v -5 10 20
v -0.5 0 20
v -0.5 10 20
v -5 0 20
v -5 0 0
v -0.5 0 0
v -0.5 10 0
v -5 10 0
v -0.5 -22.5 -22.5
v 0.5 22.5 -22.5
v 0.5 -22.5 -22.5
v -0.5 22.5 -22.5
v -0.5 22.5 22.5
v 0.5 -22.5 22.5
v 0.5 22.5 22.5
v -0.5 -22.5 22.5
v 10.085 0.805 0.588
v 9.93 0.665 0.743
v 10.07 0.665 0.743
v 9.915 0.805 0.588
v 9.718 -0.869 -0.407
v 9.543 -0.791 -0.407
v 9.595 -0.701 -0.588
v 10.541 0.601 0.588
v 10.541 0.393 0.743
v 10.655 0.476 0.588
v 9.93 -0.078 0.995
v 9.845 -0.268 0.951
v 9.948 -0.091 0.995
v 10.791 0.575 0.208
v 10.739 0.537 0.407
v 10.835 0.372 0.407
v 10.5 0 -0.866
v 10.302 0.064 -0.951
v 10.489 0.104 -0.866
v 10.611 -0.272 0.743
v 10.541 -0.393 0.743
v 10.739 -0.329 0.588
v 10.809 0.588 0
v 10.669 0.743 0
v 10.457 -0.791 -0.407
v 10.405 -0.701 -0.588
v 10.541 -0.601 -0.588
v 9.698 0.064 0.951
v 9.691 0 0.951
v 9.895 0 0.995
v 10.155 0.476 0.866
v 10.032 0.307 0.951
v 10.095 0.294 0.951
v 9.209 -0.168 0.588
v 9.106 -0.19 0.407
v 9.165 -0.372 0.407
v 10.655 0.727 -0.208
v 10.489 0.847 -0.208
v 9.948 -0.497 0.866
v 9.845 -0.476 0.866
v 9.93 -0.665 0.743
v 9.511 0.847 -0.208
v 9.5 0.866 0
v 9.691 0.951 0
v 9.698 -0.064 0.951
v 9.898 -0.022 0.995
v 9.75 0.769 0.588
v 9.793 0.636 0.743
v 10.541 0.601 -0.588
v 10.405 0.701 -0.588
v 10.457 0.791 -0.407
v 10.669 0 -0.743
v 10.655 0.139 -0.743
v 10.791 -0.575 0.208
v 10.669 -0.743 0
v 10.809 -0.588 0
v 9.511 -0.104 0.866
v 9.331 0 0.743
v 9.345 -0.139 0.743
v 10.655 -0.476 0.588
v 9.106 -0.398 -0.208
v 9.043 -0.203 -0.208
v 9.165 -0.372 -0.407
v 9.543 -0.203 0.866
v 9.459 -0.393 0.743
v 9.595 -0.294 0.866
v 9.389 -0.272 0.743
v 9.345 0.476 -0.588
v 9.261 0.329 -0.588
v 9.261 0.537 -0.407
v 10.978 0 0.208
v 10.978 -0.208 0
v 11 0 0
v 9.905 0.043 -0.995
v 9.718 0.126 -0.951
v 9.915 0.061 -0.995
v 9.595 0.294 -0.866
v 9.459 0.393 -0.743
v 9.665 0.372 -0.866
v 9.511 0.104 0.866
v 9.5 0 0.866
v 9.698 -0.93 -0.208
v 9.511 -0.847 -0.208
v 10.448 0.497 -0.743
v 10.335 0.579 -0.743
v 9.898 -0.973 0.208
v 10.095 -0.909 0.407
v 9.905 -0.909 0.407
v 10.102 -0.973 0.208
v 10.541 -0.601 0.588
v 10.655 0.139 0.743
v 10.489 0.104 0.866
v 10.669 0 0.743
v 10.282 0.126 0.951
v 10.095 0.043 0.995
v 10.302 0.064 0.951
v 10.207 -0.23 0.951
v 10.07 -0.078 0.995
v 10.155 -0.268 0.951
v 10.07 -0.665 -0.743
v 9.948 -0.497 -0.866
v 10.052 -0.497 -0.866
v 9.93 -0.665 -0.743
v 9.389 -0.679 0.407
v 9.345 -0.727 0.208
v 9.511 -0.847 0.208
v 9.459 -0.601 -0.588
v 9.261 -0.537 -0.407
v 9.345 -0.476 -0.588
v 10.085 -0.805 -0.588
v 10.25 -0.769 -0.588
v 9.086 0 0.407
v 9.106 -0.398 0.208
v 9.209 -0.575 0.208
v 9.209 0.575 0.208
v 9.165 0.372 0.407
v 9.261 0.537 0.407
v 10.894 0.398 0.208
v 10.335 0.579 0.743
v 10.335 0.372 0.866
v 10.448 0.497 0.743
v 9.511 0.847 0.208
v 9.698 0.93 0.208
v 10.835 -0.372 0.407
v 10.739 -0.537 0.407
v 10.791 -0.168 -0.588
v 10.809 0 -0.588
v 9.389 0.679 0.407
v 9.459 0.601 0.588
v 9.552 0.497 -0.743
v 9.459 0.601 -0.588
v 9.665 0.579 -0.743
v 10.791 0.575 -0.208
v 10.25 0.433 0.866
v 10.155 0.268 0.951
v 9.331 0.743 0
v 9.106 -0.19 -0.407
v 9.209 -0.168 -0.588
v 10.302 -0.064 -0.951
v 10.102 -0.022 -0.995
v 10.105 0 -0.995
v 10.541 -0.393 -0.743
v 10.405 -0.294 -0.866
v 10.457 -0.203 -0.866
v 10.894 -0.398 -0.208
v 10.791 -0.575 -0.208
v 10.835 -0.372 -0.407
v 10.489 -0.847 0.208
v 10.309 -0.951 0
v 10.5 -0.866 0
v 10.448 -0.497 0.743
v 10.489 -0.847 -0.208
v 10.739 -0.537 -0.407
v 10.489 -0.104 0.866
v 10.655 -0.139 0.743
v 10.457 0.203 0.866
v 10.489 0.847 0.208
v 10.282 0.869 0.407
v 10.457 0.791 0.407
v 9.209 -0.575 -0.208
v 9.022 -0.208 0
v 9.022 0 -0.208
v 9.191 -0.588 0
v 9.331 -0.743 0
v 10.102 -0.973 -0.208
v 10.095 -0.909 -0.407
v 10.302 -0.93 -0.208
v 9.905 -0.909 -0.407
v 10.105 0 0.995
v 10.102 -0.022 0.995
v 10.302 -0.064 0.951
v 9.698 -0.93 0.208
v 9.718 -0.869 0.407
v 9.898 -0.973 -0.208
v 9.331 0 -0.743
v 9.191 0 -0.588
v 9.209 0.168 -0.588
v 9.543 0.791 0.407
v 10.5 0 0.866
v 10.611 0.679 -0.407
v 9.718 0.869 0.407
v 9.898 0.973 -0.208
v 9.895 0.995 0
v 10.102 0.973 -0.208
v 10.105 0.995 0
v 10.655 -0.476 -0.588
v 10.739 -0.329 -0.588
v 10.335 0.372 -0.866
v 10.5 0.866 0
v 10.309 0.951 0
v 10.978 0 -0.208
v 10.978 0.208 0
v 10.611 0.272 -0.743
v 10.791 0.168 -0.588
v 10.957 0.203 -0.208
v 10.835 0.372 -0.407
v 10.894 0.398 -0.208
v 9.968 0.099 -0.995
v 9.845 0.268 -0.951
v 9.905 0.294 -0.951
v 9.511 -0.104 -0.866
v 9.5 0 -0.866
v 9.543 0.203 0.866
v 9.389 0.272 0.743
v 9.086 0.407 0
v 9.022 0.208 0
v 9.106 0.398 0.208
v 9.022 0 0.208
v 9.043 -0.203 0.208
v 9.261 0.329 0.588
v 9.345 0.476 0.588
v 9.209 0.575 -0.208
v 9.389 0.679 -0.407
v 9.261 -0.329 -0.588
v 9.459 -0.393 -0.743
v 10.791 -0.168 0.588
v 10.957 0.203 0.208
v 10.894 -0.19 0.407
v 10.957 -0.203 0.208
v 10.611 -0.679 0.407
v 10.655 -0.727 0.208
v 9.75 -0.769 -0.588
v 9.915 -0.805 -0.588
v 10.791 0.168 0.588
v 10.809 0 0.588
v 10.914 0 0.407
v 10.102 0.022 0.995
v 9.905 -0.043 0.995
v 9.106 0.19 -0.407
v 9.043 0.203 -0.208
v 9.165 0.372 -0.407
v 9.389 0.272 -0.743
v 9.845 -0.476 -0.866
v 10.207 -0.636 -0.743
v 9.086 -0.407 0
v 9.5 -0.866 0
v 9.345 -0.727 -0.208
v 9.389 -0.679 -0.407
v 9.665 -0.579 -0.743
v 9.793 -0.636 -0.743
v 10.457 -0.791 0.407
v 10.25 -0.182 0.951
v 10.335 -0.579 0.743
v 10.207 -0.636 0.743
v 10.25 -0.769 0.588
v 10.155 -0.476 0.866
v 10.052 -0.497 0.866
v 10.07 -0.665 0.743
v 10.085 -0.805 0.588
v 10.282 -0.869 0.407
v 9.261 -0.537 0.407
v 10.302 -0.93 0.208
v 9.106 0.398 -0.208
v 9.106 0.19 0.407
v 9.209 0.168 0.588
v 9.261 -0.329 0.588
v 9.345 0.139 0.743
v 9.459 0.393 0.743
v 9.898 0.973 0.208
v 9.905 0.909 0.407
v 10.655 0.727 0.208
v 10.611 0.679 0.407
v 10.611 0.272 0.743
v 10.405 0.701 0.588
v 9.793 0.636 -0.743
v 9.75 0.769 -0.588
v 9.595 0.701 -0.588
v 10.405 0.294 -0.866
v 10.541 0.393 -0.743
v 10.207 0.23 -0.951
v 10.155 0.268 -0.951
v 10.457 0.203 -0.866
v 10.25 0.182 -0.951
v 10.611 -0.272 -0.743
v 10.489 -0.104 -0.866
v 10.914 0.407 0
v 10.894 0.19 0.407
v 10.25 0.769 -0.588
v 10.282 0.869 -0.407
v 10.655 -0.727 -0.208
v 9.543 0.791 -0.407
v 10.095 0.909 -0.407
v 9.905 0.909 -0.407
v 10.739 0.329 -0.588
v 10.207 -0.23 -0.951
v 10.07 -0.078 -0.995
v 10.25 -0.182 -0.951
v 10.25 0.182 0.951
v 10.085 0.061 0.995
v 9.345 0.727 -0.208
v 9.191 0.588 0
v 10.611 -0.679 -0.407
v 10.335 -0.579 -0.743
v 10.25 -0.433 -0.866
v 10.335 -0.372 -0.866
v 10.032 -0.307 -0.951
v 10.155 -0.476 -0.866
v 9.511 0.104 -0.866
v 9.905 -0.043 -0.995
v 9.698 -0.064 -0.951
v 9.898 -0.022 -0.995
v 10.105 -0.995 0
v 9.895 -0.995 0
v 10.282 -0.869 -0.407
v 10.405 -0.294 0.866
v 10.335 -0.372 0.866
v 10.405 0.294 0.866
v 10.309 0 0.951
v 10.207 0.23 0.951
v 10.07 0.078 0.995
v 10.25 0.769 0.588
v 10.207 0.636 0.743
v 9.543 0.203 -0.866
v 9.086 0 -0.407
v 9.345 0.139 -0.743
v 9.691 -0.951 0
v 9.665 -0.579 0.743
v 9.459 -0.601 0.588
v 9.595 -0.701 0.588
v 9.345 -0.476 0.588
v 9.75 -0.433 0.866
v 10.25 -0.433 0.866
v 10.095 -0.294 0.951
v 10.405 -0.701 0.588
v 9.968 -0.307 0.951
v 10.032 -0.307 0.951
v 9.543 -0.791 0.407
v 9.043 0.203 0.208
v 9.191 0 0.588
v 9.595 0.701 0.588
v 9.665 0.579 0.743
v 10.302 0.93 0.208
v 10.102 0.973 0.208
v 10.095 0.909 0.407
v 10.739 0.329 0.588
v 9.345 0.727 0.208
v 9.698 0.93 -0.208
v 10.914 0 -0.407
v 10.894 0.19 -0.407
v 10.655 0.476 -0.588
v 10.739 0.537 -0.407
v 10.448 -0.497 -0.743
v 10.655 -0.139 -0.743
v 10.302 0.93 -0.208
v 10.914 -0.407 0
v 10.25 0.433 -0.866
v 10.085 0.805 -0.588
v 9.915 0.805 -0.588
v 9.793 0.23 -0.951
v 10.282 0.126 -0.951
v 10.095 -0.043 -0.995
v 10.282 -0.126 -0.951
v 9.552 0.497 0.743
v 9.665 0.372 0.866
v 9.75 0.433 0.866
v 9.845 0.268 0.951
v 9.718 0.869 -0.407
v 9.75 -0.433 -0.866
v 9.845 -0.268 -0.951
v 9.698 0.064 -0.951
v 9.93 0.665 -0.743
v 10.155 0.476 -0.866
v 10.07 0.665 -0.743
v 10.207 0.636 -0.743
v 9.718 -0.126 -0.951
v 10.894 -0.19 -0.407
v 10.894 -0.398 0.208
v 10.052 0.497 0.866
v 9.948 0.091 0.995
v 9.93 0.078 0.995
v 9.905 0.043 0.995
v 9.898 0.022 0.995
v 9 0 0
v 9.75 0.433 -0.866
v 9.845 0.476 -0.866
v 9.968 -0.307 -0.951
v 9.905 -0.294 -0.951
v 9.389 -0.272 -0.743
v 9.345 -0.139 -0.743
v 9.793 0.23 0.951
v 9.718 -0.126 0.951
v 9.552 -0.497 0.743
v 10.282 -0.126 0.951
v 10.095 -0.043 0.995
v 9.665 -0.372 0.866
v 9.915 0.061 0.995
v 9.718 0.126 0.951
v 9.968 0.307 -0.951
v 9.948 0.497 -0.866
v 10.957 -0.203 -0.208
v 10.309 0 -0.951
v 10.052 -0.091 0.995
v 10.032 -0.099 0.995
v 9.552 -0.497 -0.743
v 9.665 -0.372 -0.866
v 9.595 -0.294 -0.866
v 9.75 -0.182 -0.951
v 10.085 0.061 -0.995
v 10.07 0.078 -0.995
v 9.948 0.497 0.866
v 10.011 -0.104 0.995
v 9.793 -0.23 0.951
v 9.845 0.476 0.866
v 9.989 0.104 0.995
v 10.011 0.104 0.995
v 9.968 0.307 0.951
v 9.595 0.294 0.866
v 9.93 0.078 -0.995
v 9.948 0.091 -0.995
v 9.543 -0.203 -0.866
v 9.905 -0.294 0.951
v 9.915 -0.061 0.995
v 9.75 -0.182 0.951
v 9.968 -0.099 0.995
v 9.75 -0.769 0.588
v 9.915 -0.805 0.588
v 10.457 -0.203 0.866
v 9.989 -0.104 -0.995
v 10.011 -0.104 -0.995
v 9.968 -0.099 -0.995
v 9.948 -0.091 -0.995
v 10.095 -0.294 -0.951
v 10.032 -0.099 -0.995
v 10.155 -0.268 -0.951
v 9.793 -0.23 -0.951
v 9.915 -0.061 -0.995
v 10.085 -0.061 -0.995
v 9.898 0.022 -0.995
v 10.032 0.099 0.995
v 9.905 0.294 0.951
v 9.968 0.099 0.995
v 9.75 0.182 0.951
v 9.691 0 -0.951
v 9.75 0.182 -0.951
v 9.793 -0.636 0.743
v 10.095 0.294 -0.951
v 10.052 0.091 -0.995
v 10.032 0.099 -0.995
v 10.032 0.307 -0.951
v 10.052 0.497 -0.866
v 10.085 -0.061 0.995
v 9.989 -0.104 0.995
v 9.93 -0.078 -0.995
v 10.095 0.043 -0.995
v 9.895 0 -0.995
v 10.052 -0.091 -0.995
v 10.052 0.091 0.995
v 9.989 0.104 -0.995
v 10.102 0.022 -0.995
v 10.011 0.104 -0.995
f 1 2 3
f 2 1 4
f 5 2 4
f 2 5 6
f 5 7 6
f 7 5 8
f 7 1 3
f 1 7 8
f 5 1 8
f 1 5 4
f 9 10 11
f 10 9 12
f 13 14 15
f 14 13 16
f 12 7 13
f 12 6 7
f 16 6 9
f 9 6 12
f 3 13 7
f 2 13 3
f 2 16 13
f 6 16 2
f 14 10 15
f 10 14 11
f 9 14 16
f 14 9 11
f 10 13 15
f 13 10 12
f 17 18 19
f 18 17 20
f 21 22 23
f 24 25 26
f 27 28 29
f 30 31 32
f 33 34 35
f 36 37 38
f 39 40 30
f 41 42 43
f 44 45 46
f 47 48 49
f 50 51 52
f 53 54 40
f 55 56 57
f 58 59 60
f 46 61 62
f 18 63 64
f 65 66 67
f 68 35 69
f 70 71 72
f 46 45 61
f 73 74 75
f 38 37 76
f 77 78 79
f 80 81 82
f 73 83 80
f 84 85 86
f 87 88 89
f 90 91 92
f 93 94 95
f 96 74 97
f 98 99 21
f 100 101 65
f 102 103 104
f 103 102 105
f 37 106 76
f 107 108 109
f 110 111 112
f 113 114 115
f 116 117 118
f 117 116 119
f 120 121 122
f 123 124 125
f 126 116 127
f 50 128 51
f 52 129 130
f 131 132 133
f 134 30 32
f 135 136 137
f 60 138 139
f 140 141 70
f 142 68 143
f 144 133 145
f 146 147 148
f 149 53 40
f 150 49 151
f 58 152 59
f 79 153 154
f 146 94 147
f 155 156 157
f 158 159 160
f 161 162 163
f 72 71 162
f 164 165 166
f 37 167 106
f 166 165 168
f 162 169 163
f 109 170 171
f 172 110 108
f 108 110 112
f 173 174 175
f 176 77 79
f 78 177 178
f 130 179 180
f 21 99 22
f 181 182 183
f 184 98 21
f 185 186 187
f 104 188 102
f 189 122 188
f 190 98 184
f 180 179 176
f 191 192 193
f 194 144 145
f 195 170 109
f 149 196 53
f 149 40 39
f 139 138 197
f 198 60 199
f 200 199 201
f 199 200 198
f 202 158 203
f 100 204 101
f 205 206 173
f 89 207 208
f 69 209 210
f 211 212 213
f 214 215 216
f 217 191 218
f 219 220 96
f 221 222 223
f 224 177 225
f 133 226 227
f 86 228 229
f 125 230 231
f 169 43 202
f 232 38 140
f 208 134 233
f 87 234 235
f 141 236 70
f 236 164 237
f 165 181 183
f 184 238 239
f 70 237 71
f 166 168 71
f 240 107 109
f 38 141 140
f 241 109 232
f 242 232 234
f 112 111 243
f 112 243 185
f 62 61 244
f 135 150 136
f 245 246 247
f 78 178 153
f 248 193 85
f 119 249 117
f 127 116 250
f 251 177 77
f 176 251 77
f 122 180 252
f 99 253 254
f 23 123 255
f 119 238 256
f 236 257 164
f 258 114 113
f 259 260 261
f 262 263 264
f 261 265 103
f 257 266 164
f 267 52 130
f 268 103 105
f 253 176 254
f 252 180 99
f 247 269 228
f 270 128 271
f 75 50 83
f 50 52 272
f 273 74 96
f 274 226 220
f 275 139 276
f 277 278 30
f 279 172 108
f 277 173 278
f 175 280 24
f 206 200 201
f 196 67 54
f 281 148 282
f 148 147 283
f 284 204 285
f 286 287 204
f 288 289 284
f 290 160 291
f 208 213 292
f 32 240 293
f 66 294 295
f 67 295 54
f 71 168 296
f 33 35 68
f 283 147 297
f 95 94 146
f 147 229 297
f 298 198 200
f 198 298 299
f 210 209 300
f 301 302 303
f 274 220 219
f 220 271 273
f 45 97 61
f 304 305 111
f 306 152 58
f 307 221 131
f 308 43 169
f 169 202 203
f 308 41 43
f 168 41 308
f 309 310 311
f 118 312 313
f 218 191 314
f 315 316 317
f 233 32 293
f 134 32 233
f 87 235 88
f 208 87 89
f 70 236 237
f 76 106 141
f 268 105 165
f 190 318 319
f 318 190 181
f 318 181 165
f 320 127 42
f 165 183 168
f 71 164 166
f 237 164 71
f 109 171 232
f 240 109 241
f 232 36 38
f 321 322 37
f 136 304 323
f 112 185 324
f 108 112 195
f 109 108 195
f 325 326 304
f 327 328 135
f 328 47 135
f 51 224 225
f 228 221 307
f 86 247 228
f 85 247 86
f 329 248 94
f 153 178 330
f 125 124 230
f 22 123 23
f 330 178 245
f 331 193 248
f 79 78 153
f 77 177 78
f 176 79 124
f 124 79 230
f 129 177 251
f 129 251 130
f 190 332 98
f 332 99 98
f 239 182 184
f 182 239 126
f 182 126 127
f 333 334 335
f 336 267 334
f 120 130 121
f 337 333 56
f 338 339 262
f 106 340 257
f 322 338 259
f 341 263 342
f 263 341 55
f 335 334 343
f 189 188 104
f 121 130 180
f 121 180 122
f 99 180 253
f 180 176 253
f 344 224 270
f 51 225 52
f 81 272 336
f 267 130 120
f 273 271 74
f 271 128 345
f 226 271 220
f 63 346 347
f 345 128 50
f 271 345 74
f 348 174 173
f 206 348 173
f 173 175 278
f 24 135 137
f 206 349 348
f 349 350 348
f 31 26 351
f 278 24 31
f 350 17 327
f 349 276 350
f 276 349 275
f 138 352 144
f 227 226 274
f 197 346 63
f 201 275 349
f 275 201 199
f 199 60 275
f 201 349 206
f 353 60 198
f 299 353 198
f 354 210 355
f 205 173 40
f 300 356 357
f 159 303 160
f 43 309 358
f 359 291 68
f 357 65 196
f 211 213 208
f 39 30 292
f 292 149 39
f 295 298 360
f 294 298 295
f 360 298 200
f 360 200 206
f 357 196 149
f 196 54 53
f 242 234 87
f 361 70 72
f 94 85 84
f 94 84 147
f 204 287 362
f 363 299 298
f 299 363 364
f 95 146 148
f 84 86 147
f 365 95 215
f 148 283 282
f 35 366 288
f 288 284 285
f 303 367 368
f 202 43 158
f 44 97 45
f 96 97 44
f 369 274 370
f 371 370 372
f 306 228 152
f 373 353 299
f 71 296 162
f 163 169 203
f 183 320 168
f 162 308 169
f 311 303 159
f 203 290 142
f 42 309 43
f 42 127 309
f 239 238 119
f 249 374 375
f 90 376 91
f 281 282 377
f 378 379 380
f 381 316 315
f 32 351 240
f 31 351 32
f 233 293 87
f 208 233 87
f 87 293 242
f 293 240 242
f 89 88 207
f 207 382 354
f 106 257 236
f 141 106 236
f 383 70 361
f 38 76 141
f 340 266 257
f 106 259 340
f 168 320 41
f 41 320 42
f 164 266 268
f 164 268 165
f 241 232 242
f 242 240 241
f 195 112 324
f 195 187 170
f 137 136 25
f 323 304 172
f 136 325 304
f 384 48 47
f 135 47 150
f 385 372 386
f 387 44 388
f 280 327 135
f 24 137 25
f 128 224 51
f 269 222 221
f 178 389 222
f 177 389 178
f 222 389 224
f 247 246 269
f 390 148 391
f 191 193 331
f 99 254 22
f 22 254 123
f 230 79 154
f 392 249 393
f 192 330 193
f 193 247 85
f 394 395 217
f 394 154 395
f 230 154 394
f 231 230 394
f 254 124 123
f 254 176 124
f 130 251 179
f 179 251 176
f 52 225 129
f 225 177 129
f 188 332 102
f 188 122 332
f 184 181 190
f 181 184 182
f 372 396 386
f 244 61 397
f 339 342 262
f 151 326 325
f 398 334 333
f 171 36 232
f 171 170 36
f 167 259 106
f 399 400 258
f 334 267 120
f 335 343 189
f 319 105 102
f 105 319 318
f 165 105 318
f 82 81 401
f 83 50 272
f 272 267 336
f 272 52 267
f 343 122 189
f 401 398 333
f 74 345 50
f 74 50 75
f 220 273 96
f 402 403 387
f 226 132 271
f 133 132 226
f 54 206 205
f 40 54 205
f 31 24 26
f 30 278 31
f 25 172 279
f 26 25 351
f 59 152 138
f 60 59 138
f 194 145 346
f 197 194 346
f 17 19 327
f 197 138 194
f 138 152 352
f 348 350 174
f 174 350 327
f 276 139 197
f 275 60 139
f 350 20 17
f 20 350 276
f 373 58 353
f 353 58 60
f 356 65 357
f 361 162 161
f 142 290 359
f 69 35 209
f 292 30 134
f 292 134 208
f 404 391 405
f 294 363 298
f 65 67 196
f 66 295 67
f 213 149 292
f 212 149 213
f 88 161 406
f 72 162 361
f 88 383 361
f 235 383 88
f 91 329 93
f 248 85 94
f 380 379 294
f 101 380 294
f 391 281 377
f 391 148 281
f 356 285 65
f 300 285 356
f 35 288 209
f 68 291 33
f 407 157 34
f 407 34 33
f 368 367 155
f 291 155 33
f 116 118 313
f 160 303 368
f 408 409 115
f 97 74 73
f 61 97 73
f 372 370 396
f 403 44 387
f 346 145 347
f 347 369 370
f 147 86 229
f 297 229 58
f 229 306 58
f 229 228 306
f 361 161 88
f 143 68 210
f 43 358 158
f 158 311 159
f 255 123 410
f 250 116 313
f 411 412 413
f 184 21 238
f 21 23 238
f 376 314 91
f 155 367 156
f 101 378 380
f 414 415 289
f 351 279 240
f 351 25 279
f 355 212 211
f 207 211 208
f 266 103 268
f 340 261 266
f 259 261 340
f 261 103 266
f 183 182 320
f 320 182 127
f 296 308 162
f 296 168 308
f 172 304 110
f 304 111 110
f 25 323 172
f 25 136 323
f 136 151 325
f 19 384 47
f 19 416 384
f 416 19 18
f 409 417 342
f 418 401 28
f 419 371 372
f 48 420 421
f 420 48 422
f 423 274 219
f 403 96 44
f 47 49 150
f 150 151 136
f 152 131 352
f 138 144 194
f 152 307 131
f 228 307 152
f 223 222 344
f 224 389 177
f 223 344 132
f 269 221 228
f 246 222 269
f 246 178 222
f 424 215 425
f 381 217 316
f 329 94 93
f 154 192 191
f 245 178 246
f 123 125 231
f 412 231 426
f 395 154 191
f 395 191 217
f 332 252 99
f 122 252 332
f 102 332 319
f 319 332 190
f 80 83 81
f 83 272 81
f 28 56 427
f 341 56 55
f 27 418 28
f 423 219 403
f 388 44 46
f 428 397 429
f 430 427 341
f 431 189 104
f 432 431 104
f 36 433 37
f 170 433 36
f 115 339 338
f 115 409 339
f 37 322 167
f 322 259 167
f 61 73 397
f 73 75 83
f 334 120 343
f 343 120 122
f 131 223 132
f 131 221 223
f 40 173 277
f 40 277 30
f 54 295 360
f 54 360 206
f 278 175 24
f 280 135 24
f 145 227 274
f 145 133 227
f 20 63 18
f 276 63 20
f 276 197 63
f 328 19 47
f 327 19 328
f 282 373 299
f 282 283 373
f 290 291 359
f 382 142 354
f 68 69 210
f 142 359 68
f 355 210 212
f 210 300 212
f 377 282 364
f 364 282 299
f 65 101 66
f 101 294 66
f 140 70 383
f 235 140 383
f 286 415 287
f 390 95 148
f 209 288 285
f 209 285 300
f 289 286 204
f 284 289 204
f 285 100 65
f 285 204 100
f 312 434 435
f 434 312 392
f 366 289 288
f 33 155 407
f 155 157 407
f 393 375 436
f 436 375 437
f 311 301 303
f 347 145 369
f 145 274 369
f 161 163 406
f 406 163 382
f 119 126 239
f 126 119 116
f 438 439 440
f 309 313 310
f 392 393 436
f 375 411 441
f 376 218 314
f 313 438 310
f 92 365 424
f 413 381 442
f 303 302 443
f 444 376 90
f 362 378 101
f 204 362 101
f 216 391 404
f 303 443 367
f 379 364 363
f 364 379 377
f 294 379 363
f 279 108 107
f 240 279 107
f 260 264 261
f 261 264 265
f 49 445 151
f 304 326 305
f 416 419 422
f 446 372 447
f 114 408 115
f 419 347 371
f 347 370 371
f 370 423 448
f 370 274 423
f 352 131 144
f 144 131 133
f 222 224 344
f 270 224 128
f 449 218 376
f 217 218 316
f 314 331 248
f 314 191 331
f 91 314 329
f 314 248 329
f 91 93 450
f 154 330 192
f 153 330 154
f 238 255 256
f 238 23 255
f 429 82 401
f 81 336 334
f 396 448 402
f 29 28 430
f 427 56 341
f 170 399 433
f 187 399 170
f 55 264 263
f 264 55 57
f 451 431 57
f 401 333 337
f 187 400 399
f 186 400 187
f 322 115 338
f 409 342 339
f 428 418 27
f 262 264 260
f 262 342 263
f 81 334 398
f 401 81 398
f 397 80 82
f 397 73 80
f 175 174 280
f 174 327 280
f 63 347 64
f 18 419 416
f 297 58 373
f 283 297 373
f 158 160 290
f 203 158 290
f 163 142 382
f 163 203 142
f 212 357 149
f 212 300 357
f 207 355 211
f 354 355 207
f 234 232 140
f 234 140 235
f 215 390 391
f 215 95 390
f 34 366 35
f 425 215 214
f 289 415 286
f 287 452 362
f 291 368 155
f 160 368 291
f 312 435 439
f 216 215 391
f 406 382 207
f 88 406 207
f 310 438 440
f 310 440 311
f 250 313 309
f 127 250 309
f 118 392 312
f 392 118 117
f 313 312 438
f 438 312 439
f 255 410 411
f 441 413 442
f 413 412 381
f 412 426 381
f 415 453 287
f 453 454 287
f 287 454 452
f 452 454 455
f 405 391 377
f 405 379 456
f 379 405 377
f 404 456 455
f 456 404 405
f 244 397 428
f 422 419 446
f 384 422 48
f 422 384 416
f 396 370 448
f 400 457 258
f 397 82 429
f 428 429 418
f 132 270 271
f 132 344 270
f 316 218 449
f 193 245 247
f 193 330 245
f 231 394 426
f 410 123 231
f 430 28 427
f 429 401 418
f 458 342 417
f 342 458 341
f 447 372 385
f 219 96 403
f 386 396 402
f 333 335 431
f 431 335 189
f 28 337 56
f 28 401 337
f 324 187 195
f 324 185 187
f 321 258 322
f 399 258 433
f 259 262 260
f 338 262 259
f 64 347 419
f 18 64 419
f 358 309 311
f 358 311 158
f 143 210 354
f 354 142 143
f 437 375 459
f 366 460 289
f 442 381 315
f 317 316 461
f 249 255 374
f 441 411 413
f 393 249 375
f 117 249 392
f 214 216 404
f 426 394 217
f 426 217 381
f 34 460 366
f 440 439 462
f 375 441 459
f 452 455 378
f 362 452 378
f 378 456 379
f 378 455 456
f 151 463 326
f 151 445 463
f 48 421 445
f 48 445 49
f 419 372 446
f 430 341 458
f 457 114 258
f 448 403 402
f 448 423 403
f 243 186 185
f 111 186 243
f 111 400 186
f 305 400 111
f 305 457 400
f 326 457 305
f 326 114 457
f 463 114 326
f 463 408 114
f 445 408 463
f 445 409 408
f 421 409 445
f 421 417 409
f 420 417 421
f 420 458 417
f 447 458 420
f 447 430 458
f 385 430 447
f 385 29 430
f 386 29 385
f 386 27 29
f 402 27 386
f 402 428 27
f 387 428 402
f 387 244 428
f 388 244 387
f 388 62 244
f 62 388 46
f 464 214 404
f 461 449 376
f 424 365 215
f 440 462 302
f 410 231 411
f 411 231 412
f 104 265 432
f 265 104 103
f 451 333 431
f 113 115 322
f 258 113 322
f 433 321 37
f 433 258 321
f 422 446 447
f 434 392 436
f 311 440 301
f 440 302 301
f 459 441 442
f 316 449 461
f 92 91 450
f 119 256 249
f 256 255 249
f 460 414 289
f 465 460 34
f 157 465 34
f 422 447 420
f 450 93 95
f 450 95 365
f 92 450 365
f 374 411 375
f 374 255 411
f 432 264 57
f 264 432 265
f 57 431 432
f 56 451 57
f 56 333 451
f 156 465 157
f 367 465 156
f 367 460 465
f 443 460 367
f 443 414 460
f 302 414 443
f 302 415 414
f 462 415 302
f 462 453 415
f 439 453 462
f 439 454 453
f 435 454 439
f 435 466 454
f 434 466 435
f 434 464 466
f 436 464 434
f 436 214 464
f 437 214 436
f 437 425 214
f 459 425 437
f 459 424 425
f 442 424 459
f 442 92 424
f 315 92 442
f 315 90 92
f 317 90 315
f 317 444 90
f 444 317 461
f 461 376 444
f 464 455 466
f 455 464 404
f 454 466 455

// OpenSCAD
mirror([10,0,0])cube([5,10,20]);
%cube([5,10,20]);

#rotate([0,-90,0])cube([45, 45, 1], center=true);

$fn=30;
#translate([10,0,0]) sphere(1);
